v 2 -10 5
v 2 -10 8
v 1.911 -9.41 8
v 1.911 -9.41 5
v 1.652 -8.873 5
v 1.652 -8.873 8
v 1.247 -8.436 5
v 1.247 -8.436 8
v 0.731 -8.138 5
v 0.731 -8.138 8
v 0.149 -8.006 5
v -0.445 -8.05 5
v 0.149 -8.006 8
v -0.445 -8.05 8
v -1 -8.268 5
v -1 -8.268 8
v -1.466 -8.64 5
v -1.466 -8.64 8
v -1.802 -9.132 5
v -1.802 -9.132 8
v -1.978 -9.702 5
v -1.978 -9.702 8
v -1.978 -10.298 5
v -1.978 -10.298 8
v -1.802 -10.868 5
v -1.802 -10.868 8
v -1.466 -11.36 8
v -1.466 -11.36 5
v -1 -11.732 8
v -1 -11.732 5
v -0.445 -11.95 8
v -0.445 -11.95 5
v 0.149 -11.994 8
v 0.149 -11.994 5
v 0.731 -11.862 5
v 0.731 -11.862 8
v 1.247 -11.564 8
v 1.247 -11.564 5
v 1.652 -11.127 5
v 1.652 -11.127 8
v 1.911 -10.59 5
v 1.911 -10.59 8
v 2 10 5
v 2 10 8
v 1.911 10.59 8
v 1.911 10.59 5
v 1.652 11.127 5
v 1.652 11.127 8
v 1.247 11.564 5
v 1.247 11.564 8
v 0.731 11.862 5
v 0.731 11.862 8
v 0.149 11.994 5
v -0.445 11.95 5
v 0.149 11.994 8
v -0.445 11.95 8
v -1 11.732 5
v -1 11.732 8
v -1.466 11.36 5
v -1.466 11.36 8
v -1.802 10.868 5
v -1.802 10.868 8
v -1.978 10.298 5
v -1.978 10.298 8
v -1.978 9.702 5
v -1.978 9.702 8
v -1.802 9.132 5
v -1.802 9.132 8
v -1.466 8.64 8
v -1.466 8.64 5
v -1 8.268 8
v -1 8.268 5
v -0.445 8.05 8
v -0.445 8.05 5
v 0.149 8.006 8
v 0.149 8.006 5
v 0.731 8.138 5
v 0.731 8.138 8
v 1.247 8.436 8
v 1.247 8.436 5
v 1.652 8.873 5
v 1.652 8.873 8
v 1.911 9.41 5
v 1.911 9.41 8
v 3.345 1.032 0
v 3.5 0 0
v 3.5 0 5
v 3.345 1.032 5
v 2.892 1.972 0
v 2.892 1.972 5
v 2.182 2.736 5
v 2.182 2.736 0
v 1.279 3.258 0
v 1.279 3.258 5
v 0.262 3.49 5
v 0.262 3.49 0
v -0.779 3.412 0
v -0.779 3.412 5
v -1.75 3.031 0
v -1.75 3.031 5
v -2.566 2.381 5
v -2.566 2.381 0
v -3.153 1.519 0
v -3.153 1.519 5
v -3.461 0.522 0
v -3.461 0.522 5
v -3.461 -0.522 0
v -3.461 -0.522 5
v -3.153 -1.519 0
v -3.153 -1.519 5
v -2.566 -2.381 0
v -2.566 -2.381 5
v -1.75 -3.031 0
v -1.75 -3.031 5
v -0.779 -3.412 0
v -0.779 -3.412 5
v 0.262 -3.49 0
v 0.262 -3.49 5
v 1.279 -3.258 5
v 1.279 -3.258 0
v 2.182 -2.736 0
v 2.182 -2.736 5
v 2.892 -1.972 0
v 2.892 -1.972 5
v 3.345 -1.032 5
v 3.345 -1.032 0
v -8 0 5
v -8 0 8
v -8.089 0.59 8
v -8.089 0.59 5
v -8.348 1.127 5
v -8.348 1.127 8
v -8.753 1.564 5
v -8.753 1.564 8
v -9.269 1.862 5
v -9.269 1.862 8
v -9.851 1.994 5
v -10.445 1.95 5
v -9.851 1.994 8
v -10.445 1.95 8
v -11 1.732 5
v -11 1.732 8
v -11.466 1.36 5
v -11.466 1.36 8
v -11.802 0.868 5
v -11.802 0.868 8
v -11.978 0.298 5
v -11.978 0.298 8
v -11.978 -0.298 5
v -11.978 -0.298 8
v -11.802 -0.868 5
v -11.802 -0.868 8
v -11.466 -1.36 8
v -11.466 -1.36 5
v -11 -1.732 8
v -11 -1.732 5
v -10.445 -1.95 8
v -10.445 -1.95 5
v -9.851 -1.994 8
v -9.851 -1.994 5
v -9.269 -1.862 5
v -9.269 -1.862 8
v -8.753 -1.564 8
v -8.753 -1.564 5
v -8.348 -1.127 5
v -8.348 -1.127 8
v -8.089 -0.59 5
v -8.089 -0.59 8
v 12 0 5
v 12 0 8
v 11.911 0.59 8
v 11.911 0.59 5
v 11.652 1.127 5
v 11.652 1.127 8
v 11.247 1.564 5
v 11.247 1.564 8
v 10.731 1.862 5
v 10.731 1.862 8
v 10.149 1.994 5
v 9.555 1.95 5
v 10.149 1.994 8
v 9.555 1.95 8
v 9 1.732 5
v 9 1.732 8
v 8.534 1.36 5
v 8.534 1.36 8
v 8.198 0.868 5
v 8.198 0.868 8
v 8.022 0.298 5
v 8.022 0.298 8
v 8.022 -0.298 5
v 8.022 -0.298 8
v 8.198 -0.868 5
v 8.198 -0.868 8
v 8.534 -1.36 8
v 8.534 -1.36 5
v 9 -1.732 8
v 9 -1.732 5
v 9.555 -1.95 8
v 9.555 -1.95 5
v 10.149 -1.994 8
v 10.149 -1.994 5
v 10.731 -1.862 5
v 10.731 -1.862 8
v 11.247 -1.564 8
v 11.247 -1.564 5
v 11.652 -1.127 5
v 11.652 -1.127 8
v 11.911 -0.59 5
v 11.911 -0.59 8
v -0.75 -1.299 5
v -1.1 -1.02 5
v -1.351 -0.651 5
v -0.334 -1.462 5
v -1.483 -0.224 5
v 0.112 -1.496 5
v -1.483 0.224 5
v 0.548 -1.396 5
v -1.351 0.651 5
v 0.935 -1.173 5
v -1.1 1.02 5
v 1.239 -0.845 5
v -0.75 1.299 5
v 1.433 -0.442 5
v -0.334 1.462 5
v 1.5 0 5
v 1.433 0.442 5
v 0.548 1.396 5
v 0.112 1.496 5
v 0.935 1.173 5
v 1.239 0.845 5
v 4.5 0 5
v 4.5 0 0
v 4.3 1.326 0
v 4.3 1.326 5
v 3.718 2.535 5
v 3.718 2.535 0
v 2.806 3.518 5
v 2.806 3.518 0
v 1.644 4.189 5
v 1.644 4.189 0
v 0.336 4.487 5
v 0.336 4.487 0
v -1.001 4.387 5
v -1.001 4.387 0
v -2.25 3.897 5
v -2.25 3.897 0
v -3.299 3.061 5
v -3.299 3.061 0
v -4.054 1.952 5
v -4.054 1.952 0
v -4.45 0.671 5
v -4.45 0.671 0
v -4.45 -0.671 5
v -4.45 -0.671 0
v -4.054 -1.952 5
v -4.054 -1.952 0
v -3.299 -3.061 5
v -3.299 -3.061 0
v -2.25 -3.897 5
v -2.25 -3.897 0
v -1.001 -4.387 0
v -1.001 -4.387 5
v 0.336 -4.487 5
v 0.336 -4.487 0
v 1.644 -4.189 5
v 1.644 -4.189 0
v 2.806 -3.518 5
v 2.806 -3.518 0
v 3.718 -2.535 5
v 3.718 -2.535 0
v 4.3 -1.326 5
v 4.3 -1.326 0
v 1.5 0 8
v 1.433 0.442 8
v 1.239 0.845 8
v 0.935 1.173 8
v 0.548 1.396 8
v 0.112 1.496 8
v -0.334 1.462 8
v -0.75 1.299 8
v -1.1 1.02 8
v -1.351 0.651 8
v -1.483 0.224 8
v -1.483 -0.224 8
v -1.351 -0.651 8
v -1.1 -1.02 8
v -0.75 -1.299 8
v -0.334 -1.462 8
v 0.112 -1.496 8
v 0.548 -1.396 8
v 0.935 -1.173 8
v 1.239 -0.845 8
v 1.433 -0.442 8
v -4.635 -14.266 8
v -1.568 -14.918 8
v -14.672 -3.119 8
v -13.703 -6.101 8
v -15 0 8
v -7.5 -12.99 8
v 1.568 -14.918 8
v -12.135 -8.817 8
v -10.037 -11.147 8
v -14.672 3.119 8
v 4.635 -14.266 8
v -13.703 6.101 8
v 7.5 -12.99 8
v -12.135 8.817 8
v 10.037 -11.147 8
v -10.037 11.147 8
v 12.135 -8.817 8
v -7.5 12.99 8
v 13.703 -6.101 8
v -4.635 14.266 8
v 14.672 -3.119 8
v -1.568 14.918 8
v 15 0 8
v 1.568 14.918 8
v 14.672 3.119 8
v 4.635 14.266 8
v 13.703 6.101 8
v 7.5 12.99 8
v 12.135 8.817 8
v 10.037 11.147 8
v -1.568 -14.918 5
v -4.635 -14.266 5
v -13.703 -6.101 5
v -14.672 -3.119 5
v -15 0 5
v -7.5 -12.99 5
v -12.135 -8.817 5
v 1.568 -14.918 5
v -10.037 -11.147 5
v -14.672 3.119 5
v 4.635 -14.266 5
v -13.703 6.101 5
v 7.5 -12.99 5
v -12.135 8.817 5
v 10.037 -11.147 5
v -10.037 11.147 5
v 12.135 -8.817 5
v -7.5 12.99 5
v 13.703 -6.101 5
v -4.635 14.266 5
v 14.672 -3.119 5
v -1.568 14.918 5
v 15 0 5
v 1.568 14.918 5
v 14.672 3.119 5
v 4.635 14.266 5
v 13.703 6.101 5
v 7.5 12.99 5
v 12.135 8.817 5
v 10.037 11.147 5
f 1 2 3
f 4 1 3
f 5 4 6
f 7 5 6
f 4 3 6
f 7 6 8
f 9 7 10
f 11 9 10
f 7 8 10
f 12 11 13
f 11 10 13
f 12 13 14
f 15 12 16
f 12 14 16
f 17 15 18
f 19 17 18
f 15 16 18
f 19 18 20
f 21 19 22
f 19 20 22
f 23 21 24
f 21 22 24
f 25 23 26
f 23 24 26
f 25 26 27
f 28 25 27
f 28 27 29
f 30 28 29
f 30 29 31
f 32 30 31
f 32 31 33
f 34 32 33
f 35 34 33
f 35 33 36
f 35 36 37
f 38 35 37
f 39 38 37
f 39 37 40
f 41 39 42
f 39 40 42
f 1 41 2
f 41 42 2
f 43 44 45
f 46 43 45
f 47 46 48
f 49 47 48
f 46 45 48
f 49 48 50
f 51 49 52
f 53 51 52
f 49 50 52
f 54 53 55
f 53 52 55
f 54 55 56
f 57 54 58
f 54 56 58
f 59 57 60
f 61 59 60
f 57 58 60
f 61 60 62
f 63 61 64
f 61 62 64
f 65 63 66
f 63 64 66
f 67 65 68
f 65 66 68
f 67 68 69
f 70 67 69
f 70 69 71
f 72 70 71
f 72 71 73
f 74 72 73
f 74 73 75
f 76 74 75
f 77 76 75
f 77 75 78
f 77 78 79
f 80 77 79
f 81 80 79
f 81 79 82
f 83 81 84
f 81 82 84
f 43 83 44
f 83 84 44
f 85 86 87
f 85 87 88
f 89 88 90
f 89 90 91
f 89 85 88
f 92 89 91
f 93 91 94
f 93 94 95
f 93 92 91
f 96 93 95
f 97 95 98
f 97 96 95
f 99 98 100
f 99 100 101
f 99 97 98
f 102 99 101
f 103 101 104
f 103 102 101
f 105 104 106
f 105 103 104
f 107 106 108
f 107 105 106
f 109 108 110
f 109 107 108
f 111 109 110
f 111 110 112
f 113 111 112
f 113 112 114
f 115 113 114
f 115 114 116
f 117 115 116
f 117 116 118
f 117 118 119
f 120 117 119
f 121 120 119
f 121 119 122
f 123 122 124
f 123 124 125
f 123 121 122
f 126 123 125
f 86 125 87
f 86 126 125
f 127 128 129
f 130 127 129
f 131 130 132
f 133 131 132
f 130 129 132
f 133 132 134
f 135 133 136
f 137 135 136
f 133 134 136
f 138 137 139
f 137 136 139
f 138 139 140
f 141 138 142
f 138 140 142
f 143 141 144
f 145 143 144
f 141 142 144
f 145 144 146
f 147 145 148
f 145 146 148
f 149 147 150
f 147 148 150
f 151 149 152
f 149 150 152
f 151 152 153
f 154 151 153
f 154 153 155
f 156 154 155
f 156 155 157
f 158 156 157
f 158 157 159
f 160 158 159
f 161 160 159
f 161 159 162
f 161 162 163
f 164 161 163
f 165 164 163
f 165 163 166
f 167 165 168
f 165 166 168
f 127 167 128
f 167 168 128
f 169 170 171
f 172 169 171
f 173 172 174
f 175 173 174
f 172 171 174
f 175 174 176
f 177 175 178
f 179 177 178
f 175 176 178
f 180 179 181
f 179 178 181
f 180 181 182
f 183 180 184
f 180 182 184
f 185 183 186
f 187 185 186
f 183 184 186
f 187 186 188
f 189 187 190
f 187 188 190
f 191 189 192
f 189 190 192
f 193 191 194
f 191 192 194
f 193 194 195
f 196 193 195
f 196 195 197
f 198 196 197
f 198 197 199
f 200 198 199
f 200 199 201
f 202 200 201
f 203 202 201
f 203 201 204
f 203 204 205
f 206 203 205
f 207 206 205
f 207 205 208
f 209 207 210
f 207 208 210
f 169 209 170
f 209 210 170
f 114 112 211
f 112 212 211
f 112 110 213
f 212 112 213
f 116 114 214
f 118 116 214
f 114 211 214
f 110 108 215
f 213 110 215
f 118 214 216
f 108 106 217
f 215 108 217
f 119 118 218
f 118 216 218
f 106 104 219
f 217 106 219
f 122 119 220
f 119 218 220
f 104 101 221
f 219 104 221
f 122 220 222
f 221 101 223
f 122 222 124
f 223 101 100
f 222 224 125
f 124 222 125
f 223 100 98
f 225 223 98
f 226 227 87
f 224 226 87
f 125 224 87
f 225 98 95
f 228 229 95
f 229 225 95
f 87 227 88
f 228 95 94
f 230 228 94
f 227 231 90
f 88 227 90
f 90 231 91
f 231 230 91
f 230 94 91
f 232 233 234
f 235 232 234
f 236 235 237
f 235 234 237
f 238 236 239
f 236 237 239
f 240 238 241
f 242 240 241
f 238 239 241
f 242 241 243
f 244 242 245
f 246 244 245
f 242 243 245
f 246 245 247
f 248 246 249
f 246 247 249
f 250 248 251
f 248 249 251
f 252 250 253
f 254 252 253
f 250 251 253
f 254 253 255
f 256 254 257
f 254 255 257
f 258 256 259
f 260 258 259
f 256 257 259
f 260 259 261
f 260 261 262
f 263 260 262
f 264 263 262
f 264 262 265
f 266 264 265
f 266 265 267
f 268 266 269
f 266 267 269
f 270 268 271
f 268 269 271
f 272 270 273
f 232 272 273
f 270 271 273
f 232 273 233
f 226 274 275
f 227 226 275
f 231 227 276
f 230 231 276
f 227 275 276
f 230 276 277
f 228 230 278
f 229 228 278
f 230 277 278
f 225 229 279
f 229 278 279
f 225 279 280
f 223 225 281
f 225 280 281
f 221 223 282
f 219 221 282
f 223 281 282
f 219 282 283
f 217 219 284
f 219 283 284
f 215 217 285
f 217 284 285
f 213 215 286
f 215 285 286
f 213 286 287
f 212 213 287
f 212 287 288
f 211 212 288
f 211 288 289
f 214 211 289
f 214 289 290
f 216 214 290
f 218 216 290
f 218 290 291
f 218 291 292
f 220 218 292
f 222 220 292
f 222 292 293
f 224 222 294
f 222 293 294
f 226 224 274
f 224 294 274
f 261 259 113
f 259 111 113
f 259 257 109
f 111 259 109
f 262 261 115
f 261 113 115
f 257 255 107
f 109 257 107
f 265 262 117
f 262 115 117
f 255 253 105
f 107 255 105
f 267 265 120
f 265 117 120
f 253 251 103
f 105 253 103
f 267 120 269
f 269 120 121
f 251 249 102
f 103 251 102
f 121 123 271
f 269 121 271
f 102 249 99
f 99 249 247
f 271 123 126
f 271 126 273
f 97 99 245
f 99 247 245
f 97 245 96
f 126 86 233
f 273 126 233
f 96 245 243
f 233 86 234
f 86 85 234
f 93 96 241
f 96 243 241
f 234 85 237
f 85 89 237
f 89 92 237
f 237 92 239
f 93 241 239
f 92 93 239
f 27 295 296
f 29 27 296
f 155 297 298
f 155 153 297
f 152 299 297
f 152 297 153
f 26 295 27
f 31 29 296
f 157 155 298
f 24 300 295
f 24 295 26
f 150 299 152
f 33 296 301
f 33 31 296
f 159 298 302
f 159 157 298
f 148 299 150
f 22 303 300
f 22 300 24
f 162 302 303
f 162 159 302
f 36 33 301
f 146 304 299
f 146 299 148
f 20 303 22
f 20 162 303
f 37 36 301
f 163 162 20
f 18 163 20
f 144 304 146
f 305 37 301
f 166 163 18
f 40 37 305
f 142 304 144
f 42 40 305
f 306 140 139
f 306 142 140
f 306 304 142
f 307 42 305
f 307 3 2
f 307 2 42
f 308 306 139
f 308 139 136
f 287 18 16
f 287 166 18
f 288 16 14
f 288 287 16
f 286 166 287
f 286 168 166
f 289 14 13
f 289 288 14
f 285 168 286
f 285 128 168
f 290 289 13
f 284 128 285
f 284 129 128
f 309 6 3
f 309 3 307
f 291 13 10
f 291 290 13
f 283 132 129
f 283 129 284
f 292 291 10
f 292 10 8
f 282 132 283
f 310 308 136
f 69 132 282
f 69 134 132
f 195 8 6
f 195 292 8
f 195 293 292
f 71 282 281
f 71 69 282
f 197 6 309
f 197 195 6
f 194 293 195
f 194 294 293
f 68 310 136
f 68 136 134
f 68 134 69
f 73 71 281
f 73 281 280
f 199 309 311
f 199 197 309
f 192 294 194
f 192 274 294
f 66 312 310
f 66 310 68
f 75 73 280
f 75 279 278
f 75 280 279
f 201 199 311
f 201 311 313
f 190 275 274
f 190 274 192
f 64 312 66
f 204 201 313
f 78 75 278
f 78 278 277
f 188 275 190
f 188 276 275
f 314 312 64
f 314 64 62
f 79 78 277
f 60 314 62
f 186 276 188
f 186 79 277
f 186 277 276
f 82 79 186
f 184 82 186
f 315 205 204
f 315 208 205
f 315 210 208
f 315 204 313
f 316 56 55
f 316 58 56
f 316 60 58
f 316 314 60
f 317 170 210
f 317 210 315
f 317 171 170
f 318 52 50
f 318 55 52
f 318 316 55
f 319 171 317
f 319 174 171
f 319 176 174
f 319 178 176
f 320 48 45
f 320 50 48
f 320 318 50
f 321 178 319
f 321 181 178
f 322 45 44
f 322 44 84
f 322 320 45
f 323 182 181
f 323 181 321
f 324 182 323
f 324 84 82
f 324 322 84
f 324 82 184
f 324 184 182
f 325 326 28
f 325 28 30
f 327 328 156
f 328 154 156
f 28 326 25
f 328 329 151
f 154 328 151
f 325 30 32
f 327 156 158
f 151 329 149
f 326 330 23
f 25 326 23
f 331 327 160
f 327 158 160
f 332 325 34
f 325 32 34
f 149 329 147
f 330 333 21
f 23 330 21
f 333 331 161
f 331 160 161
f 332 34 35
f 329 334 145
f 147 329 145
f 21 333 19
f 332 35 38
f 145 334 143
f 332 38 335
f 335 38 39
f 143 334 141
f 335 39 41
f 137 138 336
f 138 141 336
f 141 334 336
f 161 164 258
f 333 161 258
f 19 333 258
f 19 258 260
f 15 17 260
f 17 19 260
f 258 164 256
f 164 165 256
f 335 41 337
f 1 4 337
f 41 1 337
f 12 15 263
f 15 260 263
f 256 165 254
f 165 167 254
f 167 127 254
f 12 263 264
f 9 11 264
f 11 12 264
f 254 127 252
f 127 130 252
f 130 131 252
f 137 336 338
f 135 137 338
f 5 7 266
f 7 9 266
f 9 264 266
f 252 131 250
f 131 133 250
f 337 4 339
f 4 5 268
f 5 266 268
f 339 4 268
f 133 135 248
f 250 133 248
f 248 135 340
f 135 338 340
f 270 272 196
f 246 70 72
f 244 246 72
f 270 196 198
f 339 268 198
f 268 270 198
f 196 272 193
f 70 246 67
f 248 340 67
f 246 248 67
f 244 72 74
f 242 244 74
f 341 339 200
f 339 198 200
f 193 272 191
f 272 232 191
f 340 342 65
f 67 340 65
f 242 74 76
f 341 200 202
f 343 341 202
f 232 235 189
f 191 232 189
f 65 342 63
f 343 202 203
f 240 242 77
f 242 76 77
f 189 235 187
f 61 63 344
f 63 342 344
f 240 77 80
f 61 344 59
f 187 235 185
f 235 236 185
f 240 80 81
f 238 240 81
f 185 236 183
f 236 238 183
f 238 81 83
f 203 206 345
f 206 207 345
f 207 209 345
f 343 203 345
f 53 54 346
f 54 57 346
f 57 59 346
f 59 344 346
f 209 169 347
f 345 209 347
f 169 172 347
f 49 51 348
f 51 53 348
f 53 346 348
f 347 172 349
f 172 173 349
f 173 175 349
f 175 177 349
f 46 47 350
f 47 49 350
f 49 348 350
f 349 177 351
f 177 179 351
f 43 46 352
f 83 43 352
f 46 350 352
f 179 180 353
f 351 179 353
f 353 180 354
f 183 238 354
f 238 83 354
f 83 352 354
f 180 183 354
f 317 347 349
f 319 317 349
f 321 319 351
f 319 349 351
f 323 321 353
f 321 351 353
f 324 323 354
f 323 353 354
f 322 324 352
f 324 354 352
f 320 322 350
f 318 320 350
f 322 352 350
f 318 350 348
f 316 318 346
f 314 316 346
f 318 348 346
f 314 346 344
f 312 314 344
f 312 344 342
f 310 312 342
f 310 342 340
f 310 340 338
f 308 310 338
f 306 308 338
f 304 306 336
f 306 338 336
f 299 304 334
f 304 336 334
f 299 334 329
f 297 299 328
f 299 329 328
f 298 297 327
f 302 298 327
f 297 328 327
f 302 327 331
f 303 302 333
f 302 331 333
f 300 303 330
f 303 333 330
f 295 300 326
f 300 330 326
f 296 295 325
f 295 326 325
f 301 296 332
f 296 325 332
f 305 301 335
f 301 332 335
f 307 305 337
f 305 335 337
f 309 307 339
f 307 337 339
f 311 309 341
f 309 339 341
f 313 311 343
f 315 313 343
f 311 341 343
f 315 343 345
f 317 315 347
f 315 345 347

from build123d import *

# Parameters (mm, degrees)
SKETCH_1_R          = 4.5
SKETCH_1_R_2        = 3.5
EXTRUDE_1_DEPTH     = 5
SKETCH_2_R          = 15
EXTRUDE_2_DEPTH     = 3
SKETCH_3_R          = 2
CUT_EXTRUDE_1_DEPTH = 3
SKETCH_4_R          = 1.5
CUT_EXTRUDE_2_DEPTH = 3


with BuildPart() as part:
    # 草图1 → 凸台-拉伸1 (new body)
    with BuildSketch(Plane.XY):
        Circle(SKETCH_1_R)
        Circle(SKETCH_1_R_2, mode=Mode.SUBTRACT)
    extrude(amount=EXTRUDE_1_DEPTH)

    # 草图2 → 凸台-拉伸2 (add)
    with BuildSketch(Plane.XY.offset(5)):
        Circle(SKETCH_2_R)
    extrude(amount=EXTRUDE_2_DEPTH)

    # 草图3 → 切除-拉伸1 (cut)
    with BuildSketch(Plane.XY.offset(8)):
        with Locations((-10, 0)):
            Circle(SKETCH_3_R)
        with Locations((10, 0)):
            Circle(SKETCH_3_R)
        with Locations((0, 10)):
            Circle(SKETCH_3_R)
        with Locations((0, -10)):
            Circle(SKETCH_3_R)
    extrude(amount=-CUT_EXTRUDE_1_DEPTH, mode=Mode.SUBTRACT)

    # 草图4 → 切除-拉伸2 (cut)
    with BuildSketch(Plane.XY.offset(8)):
        Circle(SKETCH_4_R)
    extrude(amount=-CUT_EXTRUDE_2_DEPTH, mode=Mode.SUBTRACT)


solid = part.part
